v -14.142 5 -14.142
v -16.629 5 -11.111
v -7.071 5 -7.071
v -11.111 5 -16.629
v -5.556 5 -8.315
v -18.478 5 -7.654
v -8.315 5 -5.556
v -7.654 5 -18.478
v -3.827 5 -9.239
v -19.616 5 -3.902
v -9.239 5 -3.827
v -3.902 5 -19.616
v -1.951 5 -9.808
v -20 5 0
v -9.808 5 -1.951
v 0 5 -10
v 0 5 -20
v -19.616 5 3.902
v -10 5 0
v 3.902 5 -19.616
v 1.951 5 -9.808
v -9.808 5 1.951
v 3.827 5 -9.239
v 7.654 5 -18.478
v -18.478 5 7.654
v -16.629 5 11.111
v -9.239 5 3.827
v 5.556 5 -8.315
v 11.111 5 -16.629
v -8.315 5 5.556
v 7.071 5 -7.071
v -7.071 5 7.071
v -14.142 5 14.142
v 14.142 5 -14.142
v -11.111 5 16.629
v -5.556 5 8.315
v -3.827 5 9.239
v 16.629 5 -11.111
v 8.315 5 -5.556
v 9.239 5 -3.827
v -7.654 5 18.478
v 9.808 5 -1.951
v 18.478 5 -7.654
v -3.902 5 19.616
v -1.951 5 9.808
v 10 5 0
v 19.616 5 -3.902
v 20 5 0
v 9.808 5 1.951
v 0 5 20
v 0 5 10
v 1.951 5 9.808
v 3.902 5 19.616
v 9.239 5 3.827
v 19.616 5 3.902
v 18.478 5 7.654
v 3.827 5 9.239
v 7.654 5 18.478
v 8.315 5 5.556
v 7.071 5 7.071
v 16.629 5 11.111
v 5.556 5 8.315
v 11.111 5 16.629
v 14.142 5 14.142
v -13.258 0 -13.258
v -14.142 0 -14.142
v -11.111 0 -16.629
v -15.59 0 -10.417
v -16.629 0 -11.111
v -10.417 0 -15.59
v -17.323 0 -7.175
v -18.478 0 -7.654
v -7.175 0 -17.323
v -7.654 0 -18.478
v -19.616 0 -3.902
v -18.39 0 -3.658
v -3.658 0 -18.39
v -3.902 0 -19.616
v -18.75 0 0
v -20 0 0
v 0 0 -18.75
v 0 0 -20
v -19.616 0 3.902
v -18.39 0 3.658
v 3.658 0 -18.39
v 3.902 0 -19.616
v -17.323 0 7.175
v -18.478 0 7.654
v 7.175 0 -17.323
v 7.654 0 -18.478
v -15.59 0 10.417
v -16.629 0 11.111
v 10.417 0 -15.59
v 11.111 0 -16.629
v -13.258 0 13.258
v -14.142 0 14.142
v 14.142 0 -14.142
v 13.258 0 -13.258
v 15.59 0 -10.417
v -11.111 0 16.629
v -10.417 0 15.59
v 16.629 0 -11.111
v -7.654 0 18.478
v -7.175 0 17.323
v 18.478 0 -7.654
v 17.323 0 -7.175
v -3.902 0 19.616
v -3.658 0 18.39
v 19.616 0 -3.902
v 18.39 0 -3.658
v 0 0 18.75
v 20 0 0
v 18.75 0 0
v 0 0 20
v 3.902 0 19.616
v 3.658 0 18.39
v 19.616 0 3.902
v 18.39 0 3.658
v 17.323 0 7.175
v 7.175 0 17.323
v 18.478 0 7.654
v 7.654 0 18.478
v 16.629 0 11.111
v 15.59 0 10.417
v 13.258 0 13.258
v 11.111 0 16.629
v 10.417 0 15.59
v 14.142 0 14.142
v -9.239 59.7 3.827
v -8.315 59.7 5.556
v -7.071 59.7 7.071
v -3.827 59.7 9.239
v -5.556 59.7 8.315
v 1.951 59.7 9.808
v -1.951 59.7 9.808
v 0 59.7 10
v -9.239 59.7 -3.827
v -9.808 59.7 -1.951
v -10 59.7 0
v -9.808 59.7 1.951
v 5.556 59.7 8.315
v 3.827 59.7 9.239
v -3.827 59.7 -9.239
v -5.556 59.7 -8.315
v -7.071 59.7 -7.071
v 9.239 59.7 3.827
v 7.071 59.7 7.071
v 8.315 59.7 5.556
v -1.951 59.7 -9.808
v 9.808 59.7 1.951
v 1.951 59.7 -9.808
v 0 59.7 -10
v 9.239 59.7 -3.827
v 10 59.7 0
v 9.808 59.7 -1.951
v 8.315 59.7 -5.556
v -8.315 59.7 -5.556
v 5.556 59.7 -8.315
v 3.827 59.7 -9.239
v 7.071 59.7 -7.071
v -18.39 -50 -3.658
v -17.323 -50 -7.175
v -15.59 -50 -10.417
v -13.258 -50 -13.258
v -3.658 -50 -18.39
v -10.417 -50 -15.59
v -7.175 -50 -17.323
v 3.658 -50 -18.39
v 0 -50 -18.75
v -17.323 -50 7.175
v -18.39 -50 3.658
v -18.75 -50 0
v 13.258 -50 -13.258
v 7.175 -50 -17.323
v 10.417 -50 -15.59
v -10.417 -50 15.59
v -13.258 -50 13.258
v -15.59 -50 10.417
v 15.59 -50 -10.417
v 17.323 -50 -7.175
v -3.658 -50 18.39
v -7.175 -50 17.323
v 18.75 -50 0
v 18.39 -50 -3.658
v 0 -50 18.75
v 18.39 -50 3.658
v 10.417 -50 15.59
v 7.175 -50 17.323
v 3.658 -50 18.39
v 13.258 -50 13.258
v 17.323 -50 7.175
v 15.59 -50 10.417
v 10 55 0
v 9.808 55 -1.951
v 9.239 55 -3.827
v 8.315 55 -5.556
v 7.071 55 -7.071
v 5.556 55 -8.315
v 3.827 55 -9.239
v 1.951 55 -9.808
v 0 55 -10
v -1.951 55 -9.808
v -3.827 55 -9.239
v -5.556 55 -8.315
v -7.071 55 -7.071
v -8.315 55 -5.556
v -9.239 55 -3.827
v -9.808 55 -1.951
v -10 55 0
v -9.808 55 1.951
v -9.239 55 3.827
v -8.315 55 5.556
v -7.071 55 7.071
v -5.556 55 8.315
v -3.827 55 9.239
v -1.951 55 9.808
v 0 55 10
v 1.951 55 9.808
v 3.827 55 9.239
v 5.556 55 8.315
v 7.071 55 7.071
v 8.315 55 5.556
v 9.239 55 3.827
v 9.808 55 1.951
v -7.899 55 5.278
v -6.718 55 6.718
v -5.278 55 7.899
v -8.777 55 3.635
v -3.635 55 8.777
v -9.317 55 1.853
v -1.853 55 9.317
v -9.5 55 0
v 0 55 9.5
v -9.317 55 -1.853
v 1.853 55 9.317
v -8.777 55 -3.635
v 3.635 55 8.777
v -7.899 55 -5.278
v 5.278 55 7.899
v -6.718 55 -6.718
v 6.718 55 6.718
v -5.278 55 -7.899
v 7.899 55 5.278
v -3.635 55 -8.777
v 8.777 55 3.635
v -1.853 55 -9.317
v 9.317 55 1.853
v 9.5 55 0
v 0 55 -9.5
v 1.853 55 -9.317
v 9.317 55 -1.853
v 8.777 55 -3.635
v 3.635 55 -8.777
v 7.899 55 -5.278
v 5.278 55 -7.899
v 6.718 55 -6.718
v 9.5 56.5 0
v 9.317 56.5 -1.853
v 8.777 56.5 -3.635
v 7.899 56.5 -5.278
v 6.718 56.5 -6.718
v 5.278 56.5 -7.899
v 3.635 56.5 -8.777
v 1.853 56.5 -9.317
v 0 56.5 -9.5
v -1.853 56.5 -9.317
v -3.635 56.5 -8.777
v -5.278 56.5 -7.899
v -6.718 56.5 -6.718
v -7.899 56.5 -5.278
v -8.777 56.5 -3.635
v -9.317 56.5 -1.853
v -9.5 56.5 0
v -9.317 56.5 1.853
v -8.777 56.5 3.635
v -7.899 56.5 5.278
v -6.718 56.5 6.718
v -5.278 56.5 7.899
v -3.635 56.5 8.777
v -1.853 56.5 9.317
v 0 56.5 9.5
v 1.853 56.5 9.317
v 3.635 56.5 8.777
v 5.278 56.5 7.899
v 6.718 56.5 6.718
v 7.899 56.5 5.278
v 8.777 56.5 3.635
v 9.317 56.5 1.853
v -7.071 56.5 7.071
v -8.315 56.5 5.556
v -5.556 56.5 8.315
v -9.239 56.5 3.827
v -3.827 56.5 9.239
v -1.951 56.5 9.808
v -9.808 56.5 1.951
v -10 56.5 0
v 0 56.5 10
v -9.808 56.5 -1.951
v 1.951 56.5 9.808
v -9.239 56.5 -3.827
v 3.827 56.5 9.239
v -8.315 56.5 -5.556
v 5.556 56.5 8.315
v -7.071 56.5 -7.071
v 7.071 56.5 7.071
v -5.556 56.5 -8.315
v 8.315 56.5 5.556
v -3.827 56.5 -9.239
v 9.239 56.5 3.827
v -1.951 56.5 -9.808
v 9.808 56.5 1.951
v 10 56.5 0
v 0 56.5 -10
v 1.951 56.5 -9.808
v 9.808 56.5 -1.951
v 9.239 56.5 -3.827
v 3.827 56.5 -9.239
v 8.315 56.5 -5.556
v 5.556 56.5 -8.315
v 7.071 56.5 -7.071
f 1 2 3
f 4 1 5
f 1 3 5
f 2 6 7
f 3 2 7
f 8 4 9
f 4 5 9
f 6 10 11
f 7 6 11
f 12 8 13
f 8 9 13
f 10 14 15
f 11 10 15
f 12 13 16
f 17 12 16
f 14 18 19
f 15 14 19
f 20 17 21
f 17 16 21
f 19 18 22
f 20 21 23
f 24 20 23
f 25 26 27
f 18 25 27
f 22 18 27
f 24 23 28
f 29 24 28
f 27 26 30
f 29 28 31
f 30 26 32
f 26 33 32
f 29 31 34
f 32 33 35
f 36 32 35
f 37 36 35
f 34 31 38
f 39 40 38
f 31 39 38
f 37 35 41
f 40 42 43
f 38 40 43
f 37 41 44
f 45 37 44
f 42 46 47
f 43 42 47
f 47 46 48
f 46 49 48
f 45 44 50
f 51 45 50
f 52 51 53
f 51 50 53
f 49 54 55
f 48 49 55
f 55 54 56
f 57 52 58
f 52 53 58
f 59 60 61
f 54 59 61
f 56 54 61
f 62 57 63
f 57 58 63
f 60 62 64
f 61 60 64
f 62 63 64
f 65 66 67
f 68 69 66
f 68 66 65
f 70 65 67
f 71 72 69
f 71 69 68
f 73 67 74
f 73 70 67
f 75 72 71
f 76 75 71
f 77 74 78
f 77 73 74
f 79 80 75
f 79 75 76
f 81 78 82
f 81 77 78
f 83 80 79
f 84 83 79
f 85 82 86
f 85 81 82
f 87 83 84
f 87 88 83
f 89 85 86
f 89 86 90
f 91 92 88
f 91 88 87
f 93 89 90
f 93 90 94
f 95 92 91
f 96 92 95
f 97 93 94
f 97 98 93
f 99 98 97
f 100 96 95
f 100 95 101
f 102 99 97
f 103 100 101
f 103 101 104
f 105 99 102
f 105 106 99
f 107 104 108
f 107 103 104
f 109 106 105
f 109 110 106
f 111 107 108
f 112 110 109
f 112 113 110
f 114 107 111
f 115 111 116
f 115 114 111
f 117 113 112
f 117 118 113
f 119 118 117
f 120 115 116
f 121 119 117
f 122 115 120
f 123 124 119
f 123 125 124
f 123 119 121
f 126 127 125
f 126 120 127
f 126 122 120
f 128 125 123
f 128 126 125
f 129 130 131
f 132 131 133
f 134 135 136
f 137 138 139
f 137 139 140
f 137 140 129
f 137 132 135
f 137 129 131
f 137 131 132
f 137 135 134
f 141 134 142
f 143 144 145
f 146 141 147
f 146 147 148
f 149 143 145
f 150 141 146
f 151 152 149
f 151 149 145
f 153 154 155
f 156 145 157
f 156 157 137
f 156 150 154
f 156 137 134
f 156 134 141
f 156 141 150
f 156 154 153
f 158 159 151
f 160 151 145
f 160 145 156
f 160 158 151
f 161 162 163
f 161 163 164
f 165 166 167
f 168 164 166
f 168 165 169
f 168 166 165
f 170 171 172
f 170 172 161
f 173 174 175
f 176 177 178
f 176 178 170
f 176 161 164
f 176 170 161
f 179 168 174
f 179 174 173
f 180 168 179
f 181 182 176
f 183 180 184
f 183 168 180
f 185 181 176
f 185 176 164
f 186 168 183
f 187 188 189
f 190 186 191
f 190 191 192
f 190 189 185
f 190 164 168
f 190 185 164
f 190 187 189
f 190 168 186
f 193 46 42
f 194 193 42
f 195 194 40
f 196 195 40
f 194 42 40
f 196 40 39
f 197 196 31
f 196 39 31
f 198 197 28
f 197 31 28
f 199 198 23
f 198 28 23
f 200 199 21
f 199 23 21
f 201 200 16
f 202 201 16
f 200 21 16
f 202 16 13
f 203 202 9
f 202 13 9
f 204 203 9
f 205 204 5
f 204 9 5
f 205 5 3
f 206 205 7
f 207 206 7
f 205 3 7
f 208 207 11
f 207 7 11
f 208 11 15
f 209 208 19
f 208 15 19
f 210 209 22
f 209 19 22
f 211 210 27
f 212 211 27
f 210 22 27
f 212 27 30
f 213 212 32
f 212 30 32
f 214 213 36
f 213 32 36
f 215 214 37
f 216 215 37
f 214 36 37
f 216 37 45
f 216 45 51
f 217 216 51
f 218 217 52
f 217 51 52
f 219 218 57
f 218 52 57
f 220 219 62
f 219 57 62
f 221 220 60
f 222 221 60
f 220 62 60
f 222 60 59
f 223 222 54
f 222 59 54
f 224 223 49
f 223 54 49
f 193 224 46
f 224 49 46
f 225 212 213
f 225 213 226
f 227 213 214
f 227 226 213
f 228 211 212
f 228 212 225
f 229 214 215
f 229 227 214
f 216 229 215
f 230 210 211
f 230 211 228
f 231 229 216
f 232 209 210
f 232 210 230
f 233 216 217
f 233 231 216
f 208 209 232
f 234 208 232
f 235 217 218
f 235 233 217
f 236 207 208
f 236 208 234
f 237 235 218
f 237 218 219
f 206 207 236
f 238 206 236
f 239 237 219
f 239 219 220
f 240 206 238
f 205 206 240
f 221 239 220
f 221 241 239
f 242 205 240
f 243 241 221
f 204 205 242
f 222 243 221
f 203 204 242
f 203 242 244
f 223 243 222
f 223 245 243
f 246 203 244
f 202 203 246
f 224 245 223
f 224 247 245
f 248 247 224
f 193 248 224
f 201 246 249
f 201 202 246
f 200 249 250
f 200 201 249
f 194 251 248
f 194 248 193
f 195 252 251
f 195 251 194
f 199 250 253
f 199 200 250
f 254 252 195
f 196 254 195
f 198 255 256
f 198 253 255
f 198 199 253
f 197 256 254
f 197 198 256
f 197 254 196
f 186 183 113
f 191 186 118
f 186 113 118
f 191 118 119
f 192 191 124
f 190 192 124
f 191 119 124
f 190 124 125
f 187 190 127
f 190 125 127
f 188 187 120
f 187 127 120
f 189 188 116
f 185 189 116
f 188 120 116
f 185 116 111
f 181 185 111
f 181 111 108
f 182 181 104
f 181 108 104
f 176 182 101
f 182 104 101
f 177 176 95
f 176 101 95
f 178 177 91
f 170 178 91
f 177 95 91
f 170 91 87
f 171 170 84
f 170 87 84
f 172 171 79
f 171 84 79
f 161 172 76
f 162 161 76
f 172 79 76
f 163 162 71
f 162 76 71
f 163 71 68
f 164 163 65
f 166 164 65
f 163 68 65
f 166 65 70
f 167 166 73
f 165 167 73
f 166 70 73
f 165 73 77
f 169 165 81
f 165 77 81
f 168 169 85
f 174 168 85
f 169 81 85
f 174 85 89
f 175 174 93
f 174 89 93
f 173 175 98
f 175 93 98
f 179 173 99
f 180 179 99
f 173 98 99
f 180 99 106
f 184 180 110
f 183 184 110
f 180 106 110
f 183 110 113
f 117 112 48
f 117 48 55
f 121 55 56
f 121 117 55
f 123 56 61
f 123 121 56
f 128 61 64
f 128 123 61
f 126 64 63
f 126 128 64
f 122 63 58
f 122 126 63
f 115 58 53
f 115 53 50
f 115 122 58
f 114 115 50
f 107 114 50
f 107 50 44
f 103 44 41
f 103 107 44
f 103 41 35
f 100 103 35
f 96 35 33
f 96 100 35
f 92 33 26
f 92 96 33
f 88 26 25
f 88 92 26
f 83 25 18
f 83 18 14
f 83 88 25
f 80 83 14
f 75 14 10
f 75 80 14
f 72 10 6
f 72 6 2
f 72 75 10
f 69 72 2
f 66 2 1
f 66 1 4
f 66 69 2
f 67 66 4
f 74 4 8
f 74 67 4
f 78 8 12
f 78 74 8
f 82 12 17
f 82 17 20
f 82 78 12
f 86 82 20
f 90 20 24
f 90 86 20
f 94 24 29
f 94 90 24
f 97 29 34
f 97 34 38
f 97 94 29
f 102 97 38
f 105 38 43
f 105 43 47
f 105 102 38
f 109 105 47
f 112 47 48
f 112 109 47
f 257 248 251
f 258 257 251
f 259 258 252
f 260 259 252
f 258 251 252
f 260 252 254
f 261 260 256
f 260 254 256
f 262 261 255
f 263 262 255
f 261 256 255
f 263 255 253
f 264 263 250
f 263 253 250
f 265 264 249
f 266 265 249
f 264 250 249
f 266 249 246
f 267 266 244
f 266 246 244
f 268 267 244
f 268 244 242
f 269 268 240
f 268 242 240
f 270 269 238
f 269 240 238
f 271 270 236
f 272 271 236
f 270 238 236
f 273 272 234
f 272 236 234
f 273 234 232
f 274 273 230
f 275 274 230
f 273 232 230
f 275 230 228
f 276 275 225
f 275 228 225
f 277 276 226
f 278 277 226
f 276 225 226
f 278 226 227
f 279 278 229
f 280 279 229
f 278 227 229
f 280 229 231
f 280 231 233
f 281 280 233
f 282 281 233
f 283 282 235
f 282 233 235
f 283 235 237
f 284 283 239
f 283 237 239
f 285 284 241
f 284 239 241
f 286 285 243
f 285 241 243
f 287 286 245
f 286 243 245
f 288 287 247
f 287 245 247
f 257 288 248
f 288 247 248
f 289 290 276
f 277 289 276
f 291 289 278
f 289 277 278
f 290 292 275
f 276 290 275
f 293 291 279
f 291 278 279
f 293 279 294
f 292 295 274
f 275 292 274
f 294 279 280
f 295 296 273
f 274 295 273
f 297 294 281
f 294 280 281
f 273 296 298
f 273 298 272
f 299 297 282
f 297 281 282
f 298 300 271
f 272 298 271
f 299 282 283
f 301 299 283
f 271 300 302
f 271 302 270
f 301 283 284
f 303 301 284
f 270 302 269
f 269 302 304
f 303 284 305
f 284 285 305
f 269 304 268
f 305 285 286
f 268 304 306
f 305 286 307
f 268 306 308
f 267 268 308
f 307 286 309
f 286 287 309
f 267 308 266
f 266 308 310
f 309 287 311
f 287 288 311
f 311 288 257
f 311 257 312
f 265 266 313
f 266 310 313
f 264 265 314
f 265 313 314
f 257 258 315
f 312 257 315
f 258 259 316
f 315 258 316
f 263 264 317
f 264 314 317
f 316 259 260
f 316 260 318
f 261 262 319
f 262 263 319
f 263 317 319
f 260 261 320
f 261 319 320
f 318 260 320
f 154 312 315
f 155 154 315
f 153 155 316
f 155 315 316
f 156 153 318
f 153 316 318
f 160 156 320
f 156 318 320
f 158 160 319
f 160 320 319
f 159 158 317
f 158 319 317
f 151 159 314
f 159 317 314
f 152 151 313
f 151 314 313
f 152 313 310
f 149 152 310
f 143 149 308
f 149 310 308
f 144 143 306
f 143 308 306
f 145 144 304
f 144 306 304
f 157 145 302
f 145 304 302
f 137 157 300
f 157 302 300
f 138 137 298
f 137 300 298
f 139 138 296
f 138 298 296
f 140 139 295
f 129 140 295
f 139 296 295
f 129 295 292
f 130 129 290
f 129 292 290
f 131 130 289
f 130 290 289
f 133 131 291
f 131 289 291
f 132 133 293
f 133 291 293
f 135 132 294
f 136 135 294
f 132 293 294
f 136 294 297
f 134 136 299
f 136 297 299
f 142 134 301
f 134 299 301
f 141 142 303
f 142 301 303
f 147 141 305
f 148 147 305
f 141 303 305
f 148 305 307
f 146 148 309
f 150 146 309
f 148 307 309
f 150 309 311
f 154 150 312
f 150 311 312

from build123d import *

# Parameters (mm, degrees)
F0_R      = 18.75
F1_DEPTH  = 50
F2_R      = 20
F3_DEPTH  = 5
F5_R      = 10
F6_DEPTH  = 50
F8_R      = 9.5
F9_DEPTH  = 1.5
F11_R     = 10
F12_DEPTH = 3.2


with BuildPart() as f1:
    # F0 (on Front) → F1 (new body)
    with BuildSketch(Plane.XZ):
        Circle(F0_R)
    extrude(amount=F1_DEPTH)

    # F2 (on Front) → F3 (join)
    with BuildSketch(Plane.XZ):
        Circle(F2_R)
    extrude(amount=-F3_DEPTH)

    # F5 (on offset) → F6 (join)
    with BuildSketch(Plane(origin=(0, 5, 0), x_dir=(1, 0, 0), z_dir=(0, 1, 0))):
        Circle(F5_R)
    extrude(amount=F6_DEPTH)

    # F8 (on offset) → F9 (join)
    with BuildSketch(Plane(origin=(0, 55, 0), x_dir=(1, 0, 0), z_dir=(0, 1, 0))):
        Circle(F8_R)
    extrude(amount=F9_DEPTH)

    # F11 (on offset) → F12 (join)
    with BuildSketch(Plane(origin=(0, 56.5, 0), x_dir=(1, 0, 0), z_dir=(0, 1, 0))):
        Circle(F11_R)
    extrude(amount=F12_DEPTH)


solid = f1.part
